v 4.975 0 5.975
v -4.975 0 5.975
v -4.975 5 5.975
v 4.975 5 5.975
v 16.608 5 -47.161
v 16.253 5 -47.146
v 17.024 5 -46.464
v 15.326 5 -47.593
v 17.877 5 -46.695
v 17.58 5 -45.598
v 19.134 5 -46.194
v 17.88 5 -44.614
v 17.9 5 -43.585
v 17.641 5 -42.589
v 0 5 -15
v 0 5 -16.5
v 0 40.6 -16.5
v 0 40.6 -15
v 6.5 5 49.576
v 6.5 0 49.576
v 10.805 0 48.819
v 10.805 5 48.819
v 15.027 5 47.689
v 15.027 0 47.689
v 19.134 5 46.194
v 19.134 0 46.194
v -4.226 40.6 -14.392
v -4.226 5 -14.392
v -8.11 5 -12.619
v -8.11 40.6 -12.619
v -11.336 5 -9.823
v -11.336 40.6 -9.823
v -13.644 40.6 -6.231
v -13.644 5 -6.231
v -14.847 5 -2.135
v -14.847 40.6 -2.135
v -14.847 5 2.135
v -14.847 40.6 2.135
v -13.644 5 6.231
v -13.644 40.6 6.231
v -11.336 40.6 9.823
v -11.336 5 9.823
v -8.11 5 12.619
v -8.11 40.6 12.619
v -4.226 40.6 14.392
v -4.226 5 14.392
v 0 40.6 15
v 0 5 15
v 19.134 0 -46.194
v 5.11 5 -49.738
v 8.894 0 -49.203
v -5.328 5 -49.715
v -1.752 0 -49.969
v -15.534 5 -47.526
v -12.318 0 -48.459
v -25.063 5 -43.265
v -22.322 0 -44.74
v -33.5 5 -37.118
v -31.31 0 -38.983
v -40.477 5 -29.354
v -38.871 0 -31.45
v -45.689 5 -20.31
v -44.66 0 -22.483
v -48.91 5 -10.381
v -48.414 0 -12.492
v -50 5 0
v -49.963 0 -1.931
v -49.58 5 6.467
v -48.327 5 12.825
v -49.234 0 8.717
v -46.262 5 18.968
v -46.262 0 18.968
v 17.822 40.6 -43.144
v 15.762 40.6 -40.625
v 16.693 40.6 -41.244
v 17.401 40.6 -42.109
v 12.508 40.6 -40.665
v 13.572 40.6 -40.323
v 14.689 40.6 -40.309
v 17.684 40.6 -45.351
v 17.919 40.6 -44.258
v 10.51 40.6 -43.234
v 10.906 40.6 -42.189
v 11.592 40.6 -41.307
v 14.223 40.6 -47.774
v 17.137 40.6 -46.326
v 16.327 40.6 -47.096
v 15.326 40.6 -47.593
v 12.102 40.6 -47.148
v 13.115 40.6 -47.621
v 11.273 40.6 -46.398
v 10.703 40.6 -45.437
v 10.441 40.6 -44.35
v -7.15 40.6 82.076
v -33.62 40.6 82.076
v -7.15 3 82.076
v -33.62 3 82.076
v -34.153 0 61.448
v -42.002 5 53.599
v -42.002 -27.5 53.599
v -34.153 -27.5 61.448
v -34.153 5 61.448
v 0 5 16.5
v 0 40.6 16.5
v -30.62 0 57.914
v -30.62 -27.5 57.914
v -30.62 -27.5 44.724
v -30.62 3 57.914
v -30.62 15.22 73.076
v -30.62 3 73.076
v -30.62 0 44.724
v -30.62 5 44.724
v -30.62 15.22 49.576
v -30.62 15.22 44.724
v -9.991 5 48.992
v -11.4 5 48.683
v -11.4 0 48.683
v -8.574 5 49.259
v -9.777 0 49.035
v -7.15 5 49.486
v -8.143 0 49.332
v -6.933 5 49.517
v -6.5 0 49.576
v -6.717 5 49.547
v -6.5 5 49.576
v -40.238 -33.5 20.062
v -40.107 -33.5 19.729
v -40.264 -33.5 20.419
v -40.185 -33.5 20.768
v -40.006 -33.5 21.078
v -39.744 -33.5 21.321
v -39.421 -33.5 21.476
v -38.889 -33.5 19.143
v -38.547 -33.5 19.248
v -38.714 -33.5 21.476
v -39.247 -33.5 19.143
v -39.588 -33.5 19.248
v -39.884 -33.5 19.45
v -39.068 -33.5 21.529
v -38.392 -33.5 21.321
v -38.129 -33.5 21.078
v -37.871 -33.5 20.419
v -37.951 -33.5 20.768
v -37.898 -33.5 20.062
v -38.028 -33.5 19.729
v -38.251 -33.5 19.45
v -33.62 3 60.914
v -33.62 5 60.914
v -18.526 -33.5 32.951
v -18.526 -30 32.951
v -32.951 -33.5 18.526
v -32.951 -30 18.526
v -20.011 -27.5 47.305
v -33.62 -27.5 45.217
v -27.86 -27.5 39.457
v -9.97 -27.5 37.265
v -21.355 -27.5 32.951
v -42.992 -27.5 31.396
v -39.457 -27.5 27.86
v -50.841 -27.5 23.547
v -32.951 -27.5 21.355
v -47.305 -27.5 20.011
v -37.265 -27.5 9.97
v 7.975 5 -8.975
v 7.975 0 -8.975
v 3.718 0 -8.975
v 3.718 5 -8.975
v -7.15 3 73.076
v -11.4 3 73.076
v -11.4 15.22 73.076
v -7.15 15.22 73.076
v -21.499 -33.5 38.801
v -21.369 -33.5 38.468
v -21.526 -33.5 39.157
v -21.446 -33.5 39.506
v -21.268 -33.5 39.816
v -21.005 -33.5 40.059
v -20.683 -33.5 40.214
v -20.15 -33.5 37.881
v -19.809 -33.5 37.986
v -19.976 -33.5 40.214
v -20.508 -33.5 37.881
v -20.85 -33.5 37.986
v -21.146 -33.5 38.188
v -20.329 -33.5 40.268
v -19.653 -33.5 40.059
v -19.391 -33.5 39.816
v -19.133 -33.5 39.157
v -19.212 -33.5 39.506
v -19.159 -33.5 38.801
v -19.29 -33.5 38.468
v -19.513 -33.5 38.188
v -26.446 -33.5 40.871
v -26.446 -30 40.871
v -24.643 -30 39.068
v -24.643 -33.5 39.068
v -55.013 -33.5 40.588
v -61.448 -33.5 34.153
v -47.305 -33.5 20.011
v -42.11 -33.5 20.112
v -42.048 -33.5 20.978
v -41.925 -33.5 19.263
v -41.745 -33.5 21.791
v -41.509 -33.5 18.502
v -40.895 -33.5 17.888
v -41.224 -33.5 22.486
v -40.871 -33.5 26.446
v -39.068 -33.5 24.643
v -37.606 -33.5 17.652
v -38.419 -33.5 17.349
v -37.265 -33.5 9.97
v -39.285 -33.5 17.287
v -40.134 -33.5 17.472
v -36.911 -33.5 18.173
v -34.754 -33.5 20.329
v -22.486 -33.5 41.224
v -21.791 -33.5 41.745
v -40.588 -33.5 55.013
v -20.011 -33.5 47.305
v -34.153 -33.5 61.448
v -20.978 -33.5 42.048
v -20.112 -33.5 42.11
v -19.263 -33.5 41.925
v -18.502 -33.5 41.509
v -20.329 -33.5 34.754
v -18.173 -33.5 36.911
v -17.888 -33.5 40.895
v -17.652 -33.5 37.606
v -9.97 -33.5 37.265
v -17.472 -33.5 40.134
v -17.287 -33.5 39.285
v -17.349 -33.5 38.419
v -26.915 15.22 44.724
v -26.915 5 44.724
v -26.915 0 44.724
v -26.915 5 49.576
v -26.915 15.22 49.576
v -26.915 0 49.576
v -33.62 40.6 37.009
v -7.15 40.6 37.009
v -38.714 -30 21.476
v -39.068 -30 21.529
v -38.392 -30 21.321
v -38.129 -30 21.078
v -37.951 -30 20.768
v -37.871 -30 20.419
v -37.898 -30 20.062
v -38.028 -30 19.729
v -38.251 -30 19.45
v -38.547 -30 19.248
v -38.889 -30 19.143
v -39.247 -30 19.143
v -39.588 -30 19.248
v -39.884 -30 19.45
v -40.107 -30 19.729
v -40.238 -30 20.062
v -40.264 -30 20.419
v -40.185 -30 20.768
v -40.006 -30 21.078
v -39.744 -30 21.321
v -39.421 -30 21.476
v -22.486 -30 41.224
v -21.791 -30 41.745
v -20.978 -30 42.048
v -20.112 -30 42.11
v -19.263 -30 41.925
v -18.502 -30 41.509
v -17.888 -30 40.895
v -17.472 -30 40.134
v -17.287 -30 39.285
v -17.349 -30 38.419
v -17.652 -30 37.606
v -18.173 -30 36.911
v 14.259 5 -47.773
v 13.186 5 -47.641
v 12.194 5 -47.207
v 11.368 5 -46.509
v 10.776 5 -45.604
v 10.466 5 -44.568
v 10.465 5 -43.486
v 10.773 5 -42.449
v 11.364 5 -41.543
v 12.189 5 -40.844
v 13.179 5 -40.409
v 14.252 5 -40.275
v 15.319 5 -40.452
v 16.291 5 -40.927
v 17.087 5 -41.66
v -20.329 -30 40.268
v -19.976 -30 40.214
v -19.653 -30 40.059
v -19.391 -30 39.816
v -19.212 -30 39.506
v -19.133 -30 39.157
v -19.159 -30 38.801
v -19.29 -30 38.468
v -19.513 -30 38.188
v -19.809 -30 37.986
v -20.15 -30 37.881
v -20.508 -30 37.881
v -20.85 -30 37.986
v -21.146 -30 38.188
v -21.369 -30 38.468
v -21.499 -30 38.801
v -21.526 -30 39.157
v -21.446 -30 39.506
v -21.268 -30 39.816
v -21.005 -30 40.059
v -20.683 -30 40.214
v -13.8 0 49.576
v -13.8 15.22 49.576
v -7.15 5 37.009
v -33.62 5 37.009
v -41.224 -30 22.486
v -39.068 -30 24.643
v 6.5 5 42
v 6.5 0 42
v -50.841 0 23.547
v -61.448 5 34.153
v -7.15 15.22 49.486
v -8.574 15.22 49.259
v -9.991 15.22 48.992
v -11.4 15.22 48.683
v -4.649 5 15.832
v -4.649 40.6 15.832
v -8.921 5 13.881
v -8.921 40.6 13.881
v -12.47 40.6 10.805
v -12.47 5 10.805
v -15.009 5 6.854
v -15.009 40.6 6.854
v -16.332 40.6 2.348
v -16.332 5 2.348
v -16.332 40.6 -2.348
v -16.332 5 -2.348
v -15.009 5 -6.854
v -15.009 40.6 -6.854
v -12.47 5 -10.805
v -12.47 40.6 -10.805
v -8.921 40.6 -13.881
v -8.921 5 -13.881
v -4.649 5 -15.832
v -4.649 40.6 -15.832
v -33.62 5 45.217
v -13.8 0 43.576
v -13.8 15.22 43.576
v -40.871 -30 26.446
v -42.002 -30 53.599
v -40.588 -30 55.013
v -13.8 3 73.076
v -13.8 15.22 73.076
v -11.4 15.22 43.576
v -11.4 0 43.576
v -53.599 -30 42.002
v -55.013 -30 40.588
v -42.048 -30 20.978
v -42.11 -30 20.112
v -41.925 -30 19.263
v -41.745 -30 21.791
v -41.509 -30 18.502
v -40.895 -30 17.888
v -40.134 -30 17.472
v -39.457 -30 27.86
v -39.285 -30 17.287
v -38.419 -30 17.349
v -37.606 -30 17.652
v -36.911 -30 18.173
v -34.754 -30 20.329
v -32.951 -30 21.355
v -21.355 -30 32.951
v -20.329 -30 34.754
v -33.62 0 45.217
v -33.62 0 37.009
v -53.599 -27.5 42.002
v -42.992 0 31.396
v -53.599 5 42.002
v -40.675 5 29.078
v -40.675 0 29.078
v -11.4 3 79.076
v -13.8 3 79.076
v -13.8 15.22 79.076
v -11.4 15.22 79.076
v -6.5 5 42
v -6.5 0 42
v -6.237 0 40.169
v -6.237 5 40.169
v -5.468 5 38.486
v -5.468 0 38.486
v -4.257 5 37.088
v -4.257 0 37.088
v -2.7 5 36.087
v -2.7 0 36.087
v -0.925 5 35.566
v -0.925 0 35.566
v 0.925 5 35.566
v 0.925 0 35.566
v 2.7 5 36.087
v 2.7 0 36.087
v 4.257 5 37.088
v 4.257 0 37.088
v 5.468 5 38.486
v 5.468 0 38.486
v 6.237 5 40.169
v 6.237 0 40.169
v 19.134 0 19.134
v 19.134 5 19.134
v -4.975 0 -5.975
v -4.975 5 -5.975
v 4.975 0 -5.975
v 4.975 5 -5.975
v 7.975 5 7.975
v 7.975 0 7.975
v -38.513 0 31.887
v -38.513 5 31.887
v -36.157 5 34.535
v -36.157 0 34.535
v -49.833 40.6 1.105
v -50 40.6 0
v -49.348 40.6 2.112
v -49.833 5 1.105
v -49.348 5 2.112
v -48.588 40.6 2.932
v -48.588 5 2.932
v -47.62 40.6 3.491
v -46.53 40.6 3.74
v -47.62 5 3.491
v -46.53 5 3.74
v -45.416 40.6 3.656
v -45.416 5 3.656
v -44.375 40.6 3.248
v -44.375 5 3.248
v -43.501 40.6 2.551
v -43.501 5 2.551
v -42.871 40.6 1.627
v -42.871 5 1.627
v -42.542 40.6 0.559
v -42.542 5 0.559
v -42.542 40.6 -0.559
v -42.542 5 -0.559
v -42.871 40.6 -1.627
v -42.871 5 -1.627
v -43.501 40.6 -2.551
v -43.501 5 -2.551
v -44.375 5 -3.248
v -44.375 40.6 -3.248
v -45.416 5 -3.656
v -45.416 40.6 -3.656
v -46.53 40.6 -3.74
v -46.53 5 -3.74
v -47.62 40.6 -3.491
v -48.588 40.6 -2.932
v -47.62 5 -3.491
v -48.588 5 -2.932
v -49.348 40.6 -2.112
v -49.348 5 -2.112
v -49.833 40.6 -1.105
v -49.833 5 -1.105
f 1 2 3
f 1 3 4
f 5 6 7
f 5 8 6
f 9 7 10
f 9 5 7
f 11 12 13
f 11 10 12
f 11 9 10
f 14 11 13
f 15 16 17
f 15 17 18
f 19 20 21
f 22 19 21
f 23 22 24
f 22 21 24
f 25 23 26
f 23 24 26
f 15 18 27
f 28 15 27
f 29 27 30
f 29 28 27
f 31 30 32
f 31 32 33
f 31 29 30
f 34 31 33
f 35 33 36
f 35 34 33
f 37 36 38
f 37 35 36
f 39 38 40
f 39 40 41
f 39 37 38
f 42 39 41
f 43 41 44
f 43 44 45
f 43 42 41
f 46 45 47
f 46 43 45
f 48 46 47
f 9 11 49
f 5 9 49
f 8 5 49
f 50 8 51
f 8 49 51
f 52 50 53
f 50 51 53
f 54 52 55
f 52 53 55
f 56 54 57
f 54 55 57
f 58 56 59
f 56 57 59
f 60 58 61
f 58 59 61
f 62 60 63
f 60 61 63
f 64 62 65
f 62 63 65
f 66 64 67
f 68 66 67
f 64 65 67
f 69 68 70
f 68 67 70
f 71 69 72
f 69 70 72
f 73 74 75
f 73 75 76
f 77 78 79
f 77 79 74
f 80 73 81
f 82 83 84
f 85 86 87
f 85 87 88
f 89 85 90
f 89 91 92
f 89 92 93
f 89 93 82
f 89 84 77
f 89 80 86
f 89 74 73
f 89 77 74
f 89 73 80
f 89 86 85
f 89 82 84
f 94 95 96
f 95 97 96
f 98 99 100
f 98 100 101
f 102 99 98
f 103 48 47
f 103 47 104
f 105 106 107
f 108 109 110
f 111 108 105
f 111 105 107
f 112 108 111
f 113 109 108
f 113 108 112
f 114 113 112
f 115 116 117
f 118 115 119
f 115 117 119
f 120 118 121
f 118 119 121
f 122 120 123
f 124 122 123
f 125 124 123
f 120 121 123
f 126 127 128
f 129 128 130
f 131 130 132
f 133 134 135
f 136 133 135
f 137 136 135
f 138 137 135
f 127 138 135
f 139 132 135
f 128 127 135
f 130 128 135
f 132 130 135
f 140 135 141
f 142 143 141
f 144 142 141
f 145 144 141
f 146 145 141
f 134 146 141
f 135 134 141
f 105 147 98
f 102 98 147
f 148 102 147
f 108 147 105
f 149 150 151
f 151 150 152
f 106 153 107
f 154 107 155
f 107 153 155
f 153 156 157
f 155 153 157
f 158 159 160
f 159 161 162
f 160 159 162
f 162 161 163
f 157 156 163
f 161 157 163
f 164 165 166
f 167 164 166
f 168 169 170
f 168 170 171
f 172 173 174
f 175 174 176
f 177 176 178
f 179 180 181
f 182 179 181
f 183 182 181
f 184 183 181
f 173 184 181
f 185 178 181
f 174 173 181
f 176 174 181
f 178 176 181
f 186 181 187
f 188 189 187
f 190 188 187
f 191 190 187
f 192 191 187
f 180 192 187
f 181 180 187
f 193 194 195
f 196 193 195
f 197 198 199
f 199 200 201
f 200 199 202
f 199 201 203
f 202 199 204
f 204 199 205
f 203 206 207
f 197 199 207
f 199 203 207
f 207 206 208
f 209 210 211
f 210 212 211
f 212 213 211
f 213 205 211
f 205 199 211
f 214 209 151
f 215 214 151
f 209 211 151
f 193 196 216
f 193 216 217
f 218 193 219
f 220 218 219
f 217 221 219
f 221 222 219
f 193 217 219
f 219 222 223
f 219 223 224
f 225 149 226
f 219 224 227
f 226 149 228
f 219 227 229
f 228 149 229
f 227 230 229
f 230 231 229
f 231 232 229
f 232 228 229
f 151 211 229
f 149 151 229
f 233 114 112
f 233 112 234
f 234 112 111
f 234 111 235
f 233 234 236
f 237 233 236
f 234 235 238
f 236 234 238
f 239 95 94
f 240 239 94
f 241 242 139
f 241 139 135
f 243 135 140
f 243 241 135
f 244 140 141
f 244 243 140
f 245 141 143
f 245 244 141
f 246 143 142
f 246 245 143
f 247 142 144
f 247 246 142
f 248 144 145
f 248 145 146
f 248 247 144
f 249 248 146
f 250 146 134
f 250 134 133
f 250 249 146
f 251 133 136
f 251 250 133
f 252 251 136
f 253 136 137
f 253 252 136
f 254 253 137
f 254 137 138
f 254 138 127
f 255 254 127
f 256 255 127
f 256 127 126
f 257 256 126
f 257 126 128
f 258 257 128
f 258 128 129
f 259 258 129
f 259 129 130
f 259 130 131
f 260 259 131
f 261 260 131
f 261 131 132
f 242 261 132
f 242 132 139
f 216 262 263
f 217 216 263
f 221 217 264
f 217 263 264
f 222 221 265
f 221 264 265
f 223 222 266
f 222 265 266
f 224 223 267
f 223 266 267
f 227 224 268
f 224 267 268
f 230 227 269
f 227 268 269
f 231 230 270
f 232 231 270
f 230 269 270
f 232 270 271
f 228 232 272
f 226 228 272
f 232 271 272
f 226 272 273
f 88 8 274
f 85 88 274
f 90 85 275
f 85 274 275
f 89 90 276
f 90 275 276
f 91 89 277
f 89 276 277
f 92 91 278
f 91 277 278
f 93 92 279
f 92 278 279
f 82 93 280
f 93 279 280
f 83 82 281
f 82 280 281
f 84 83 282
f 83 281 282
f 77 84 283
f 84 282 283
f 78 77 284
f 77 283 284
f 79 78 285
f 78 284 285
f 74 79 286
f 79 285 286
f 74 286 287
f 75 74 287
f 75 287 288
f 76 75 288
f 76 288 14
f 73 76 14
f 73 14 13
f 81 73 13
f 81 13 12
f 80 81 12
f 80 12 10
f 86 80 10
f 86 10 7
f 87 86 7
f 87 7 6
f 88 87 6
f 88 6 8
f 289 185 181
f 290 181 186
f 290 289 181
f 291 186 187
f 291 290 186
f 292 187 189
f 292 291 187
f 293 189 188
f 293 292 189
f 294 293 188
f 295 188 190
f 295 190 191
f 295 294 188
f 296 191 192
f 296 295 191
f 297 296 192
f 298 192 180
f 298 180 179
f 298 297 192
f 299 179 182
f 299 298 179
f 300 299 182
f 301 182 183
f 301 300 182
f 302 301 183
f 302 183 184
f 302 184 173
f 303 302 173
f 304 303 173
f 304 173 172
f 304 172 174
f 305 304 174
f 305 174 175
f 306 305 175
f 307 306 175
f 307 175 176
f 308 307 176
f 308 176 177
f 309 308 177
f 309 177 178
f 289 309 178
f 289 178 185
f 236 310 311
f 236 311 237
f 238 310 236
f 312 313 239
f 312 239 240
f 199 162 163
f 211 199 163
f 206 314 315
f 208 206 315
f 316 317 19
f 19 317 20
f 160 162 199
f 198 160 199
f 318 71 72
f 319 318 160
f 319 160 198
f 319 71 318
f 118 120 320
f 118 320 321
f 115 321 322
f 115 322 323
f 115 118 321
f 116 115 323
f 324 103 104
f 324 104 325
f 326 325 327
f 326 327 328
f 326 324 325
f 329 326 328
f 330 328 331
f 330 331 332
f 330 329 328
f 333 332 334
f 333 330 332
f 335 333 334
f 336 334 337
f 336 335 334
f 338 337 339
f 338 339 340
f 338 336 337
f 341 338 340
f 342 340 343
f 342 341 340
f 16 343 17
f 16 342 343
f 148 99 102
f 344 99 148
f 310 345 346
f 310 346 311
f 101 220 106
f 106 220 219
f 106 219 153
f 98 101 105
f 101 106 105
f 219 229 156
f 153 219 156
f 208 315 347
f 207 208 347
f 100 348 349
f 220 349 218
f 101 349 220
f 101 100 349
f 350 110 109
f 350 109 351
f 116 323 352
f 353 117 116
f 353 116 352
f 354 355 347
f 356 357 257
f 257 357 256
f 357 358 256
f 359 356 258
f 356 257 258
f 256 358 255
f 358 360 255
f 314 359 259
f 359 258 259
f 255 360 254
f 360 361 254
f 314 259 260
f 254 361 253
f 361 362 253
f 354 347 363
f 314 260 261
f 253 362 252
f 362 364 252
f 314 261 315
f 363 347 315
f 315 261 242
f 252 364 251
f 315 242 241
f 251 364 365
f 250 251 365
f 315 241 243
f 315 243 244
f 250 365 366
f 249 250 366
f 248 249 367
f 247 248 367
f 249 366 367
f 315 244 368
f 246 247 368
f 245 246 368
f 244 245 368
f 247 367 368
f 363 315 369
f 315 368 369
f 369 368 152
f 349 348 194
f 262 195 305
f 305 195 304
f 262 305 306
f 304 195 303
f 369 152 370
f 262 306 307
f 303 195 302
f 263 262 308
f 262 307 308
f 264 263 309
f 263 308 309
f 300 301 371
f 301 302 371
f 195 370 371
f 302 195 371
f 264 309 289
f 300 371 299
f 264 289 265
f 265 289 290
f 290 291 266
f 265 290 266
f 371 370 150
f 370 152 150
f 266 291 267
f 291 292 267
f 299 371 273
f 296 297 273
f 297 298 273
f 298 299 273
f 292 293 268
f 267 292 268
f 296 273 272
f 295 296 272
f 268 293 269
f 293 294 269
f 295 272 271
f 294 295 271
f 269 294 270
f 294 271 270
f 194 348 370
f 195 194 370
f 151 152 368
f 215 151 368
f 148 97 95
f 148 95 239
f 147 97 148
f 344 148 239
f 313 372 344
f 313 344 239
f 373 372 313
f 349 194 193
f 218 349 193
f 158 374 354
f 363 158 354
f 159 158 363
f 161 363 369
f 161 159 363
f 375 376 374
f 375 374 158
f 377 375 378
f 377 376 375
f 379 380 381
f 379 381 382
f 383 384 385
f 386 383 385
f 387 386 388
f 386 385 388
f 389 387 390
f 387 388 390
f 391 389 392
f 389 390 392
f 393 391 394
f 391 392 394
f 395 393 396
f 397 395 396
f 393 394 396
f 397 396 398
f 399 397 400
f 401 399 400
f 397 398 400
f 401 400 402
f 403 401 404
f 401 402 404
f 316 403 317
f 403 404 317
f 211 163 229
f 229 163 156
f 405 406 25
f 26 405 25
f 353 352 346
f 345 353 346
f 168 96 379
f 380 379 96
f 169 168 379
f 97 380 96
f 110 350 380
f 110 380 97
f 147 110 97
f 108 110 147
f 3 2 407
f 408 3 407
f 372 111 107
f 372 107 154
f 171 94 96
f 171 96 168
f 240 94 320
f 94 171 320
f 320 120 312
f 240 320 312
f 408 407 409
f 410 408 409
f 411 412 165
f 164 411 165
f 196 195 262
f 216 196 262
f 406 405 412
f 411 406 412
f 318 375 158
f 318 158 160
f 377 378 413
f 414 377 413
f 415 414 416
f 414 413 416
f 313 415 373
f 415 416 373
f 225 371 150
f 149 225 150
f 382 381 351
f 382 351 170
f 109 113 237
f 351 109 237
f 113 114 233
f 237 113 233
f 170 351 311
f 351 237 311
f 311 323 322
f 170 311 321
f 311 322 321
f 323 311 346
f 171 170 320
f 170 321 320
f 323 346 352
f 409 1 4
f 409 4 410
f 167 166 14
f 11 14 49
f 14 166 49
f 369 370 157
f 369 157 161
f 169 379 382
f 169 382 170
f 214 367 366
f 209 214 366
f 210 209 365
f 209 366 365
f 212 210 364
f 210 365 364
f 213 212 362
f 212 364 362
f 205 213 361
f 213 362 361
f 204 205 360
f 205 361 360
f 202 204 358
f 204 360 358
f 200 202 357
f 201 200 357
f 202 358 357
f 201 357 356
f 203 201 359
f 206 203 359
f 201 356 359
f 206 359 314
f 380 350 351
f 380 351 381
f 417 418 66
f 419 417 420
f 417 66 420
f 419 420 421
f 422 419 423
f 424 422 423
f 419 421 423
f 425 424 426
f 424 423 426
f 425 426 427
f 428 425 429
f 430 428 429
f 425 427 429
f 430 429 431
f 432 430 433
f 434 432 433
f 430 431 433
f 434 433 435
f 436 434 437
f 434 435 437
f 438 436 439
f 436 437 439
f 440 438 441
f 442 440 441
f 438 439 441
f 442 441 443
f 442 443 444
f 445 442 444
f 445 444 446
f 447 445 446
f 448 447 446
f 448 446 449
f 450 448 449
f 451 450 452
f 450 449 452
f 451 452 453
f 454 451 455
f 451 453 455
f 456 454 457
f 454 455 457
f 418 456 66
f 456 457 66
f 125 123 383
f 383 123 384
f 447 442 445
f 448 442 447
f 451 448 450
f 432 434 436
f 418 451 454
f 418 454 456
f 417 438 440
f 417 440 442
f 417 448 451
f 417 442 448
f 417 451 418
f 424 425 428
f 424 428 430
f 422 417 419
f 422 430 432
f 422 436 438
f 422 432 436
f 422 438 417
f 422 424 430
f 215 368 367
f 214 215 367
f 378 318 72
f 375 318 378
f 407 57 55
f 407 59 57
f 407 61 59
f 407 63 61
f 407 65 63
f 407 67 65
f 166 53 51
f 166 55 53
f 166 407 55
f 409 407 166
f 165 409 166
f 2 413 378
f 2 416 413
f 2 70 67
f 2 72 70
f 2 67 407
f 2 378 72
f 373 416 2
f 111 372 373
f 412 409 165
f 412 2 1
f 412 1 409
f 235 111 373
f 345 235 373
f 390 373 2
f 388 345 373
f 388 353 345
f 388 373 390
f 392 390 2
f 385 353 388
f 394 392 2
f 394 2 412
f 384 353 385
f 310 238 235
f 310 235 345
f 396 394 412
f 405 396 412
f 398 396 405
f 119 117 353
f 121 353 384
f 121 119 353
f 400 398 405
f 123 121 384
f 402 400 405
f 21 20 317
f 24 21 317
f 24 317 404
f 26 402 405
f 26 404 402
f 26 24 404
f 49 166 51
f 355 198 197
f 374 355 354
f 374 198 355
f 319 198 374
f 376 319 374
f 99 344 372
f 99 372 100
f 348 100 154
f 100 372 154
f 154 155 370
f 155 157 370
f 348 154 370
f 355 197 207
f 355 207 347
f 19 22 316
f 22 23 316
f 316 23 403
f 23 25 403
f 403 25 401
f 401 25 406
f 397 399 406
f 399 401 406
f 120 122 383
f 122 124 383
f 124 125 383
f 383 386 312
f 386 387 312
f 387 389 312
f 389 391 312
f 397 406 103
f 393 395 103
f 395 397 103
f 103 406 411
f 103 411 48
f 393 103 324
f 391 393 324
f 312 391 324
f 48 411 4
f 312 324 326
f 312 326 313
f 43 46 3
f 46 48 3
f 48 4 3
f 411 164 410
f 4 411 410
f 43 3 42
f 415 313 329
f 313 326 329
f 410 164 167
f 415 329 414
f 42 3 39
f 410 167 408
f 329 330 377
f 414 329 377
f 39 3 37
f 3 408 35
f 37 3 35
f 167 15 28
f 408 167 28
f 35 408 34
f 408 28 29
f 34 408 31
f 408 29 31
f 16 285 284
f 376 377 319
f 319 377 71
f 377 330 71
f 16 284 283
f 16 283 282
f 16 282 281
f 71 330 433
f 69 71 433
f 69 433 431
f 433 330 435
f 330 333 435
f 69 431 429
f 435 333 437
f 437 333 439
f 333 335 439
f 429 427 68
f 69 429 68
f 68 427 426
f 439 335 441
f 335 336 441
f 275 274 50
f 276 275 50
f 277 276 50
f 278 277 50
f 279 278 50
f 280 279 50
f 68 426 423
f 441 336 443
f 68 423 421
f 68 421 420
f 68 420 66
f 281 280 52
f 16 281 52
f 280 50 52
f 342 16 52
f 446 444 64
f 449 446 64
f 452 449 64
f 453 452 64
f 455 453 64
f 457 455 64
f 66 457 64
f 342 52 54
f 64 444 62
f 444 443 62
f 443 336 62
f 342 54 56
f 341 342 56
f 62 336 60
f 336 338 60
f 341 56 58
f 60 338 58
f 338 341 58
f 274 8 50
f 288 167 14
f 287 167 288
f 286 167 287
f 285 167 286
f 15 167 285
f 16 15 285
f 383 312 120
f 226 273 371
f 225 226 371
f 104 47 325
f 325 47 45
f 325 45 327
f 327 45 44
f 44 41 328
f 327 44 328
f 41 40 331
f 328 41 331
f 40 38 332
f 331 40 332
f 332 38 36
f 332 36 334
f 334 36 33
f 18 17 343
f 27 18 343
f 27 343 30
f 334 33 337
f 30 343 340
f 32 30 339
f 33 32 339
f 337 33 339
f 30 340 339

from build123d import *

# Parameters (mm, degrees)
SKETCH1_W               = 9.95
SKETCH1_H               = 11.95
BOSS_EXTRUDE2_DEPTH     = 5
BOSS_EXTRUDE6_DEPTH     = 35.6
SKETCH8_R               = 3.75
BOSS_EXTRUDE8_DEPTH     = 35.6
BOSS_EXTRUDE9_DEPTH     = 12.22
CUT_EXTRUDE1_DEPTH      = 104.199711628
CUT_EXTRUDE1_DEPTH_BACK = 104.199711628
SKETCH10_W              = 26.47
SKETCH10_H              = 45.066300886
BOSS_EXTRUDE10_DEPTH    = 25.38
CUT_EXTRUDE2_DEPTH      = 104.199711628
CUT_EXTRUDE2_DEPTH_BACK = 12.22
SKETCH11_W              = 3.704655087
SKETCH11_H              = 4.851710635
SKETCH14_R              = 1.2
SKETCH14_R_2            = 1.199999993
BOSS_EXTRUDE11_DEPTH    = 2.5
BOSS_EXTRUDE12_DEPTH    = 6
SKETCH17_R              = 1.199999993
BOSS_EXTRUDE13_DEPTH    = 6
CUT_EXTRUDE3_DEPTH      = 122.35580118
CUT_EXTRUDE3_DEPTH_BACK = 122.35580118
SKETCH18_W              = 20
SKETCH18_H              = 100
BOSS_EXTRUDE14_DEPTH    = 20
BOSS_EXTRUDE15_DEPTH    = 5
CUT_EXTRUDE4_START      = 30
CUT_EXTRUDE4_DEPTH      = 30
BOSS_EXTRUDE16_START    = 3
BOSS_EXTRUDE16_DEPTH    = 3
BOSS_EXTRUDE17_START    = 3
BOSS_EXTRUDE17_DEPTH    = 3
BOSS_EXTRUDE18_DEPTH    = 27.5


with BuildPart() as part:
    # Sketch1 → Boss-Extrude2 (new body)
    with BuildSketch(Plane(origin=(0, 0, 0), x_dir=(1, 0, 0), z_dir=(0, 1, 0))):
        with BuildLine():
            Line((35.355339059, -35.355339059), (7.975, -7.975))
            Line((7.975, -7.975), (7.975, 8.975))
            Line((7.975, 8.975), (3.717566722, 8.975))
            Line((3.717566722, 8.975), (19.134171618, 46.193976626))
            ThreePointArc((19.134171618, 46.193976626), (-48.299723588, 12.928136036), (-6.5, -49.575699692))
            Line((-6.5, -49.575699692), (-6.5, -42))
            ThreePointArc((-6.5, -42), (0, -35.5), (6.5, -42))
            Line((6.5, -42), (6.5, -49.575699692))
            ThreePointArc((6.5, -49.575699692), (22.102534155, -44.84950372), (35.355339059, -35.355339059))
        make_face()
        Rectangle(SKETCH1_W, SKETCH1_H, mode=Mode.SUBTRACT)
    extrude(amount=BOSS_EXTRUDE2_DEPTH)

    # Sketch4 → Boss-Extrude6 (add)
    with BuildSketch(Plane(origin=(0, 5, 0), x_dir=(1, 0, 0), z_dir=(0, 1, 0))):
        with BuildLine():
            Line((0, 16.5), (0, 15))
            ThreePointArc((0, 15), (-15, 0), (0, -15))
            Line((0, -15), (0, -16.5))
            ThreePointArc((0, -16.5), (-16.5, 0), (0, 16.5))
        make_face()
    extrude(amount=BOSS_EXTRUDE6_DEPTH)

    # Sketch8 → Boss-Extrude8 (add)
    with BuildSketch(Plane(origin=(0, 5, 0), x_dir=(1, 0, 0), z_dir=(0, 1, 0))):
        with Locations(Location((14.176286342, 44.023804987, 0), (0, 0, 72.150709005))):
            Circle(SKETCH8_R)
        with Locations(Location((29.944361597, -35.247662455, 0), (0, 0, 45))):
            Circle(SKETCH8_R)
        with Locations(Location((-46.25, 0, 0), (0, 0, 179.999564815))):
            Circle(SKETCH8_R)
    extrude(amount=BOSS_EXTRUDE8_DEPTH)

    # Sketch9 → Boss-Extrude9 (add)
    with BuildSketch(Plane(origin=(0, 3, 0), x_dir=(-1, 0, 0), z_dir=(0, -1, 0))):
        with BuildLine():
            Line((11.4, -79.075699692), (11.4, -73.075699692))
            Line((11.4, -73.075699692), (7.15, -73.075699692))
            Line((7.15, -73.075699692), (7.15, -82.075699692))
            Line((7.15, -82.075699692), (33.62, -82.075699692))
            Line((33.62, -82.075699692), (33.62, -37.009398806))
            ThreePointArc((33.62, -37.009398806), (24.345047627, -43.67285949), (13.8, -48.057881768))
            Line((13.8, -48.057881768), (13.8, -49.575699692))
            Line((13.8, -49.575699692), (30.62, -49.575699692))
            Line((30.62, -49.575699692), (30.62, -73.075699692))
            Line((30.62, -73.075699692), (13.8, -73.075699692))
            Line((13.8, -73.075699692), (13.8, -79.075699692))
            Line((13.8, -79.075699692), (11.4, -79.075699692))
        make_face()
        with BuildLine():
            Line((7.15, -37.009398806), (7.15, -49.486134422))
            ThreePointArc((7.15, -49.486134422), (9.283687764, -49.130572371), (11.4, -48.683056601))
            Line((11.4, -48.683056601), (11.4, -43.575699692))
            Line((11.4, -43.575699692), (13.8, -43.575699692))
            Line((13.8, -43.575699692), (13.8, -48.057881768))
            ThreePointArc((13.8, -48.057881768), (24.345047627, -43.67285949), (33.62, -37.009398806))
            Line((33.62, -37.009398806), (7.15, -37.009398806))
        make_face()
    extrude(amount=-BOSS_EXTRUDE9_DEPTH)

    # Sketch9<3> → Cut-Extrude1 (cut, two sides: drawn at the far end of the back side and taken through both)
    with BuildSketch(Plane(origin=(0, 3, 0), x_dir=(-1, 0, 0), z_dir=(0, -1, 0)).offset(-CUT_EXTRUDE1_DEPTH_BACK)):
        with BuildLine():
            Line((7.15, -73.075699692), (11.4, -73.075699692))
            Line((11.4, -73.075699692), (11.4, -79.075699692))
            Line((11.4, -79.075699692), (13.8, -79.075699692))
            Line((13.8, -79.075699692), (13.8, -73.075699692))
            Line((13.8, -73.075699692), (30.62, -73.075699692))
            Line((30.62, -73.075699692), (30.62, -49.575699692))
            Line((30.62, -49.575699692), (13.8, -49.575699692))
            Line((13.8, -49.575699692), (13.8, -48.057881768))
            ThreePointArc((13.8, -48.057881768), (12.60387682, -48.38535201), (11.4, -48.683056601))
            Line((11.4, -48.683056601), (11.4, -49.575699692))
            Line((11.4, -49.575699692), (7.15, -49.575699692))
            Line((7.15, -49.575699692), (7.15, -73.075699692))
        make_face()
        with BuildLine():
            Line((11.4, -43.575699692), (11.4, -48.683056601))
            ThreePointArc((11.4, -48.683056601), (12.60387682, -48.38535201), (13.8, -48.057881768))
            Line((13.8, -48.057881768), (13.8, -43.575699692))
            Line((13.8, -43.575699692), (11.4, -43.575699692))
        make_face()
    extrude(amount=CUT_EXTRUDE1_DEPTH + CUT_EXTRUDE1_DEPTH_BACK, mode=Mode.SUBTRACT)

    # Sketch10 → Boss-Extrude10 (add)
    with BuildSketch(Plane(origin=(0, 15.22, 0), x_dir=(1, 0, 0), z_dir=(0, 1, 0))):
        with Locations((-20.385, -59.542549249)):
            Rectangle(SKETCH10_W, SKETCH10_H)
    extrude(amount=BOSS_EXTRUDE10_DEPTH)

    # Sketch11 → Cut-Extrude2 (cut, two sides: drawn at the far end of the back side and taken through both)
    with BuildSketch(Plane.XZ.offset(-3).offset(-CUT_EXTRUDE2_DEPTH_BACK)):
        with Locations((-28.767672457, 47.149844375)):
            Rectangle(SKETCH11_W, SKETCH11_H)
    extrude(amount=CUT_EXTRUDE2_DEPTH + CUT_EXTRUDE2_DEPTH_BACK, mode=Mode.SUBTRACT)

    # Sketch18 → Cut-Extrude3 (cut, two sides: drawn at the far end of the back side and taken through both)
    with BuildSketch(Plane.XZ.offset(33.5).offset(-CUT_EXTRUDE3_DEPTH_BACK)):
        with Locations((29.134171618, 3.806023374)):
            Rectangle(SKETCH18_W, SKETCH18_H)
    extrude(amount=CUT_EXTRUDE3_DEPTH + CUT_EXTRUDE3_DEPTH_BACK, mode=Mode.SUBTRACT)

    # Sketch20 → Boss-Extrude15 (add)
    with BuildSketch(Plane(origin=(0, 5, 0), x_dir=(1, 0, 0), z_dir=(0, 1, 0))):
        Polygon((-61.447579228, -34.153257501), (-44.858284064, -17.563962337), (-37.009398806, -25.412847595), (-53.59869397, -42.002142759), align=None)
        Polygon((-42.002142759, -53.59869397), (-34.153257487, -61.447579241), (-17.563962324, -44.858284077), (-25.412847595, -37.009398806), align=None)
    extrude(amount=-BOSS_EXTRUDE15_DEPTH)

    # Sketch21 → Cut-Extrude4 (cut)
    with BuildSketch(Plane.XZ.offset(-15.22).offset(CUT_EXTRUDE4_START)):
        with BuildLine():
            Line((-7.15, 49.486134422), (-7.15, 73.075699692))
            Line((-7.15, 73.075699692), (-11.4, 73.075699692))
            Line((-11.4, 73.075699692), (-11.4, 79.075699692))
            Line((-11.4, 79.075699692), (-13.8, 79.075699692))
            Line((-13.8, 79.075699692), (-13.8, 73.075699692))
            Line((-13.8, 73.075699692), (-30.62, 73.075699692))
            Line((-30.62, 73.075699692), (-30.62, 44.723989057))
            Line((-30.62, 44.723989057), (-26.915344913, 44.723989057))
            Line((-26.915344913, 44.723989057), (-26.915344913, 49.575699692))
            Line((-26.915344913, 49.575699692), (-13.8, 49.575699692))
            Line((-13.8, 49.575699692), (-13.8, 43.575699692))
            Line((-13.8, 43.575699692), (-11.4, 43.575699692))
            Line((-11.4, 43.575699692), (-11.4, 48.683056601))
            ThreePointArc((-11.4, 48.683056601), (-9.283687764, 49.130572371), (-7.15, 49.486134422))
        make_face()
    extrude(amount=-CUT_EXTRUDE4_DEPTH, mode=Mode.SUBTRACT)

    # Sketch22 → Boss-Extrude16 (add)
    with BuildSketch(Plane.XZ.offset(-3).offset(BOSS_EXTRUDE16_START)):
        with BuildLine():
            Line((-29.078364141, 40.674915352), (-33.62, 45.216551211))
            Line((-33.62, 45.216551211), (-33.62, 37.009398806))
            ThreePointArc((-33.62, 37.009398806), (-31.402710382, 38.908479547), (-29.078364141, 40.674915352))
        make_face()
    extrude(amount=-BOSS_EXTRUDE16_DEPTH)

    # Sketch23 → Boss-Extrude17 (add)
    with BuildSketch(Plane.XZ.offset(-3).offset(BOSS_EXTRUDE17_START)):
        with BuildLine():
            Line((-22.281377939, 49.575699692), (-18.968096289, 46.262418043))
            ThreePointArc((-18.968096289, 46.262418043), (-16.408624443, 47.23089078), (-13.8, 48.057881768))
            Line((-13.8, 48.057881768), (-13.8, 49.575699692))
            Line((-13.8, 49.575699692), (-22.281377939, 49.575699692))
        make_face()
    extrude(amount=-BOSS_EXTRUDE17_DEPTH)



with BuildPart() as body_2:
    # Sketch14 → Boss-Extrude11 (new body)
    with BuildSketch(Plane(origin=(0, -30, 0), x_dir=(-1, 0, 0), z_dir=(0, -1, 0))):
        with BuildLine():
            Line((24.642671324, -39.067649661), (26.445793573, -40.870771909))
            Line((26.445793573, -40.870771909), (27.860007135, -39.456558346))
            Line((27.860007135, -39.456558346), (21.354624748, -32.951175959))
            Line((21.354624748, -32.951175959), (32.951175959, -21.354624748))
            Line((32.951175959, -21.354624748), (39.456558346, -27.860007135))
            Line((39.456558346, -27.860007135), (40.870771909, -26.445793573))
            Line((40.870771909, -26.445793573), (39.067649617, -24.64267128))
            Line((39.067649617, -24.64267128), (41.224325286, -22.485995585))
            ThreePointArc((41.224325286, -22.485995585), (41.22432526, -18.17264422), (36.910973895, -18.172644246))
            Line((36.910973895, -18.172644246), (34.754298225, -20.329319941))
            Line((34.754298225, -20.329319941), (32.951175922, -18.52619766))
            Line((32.951175922, -18.52619766), (18.526197623, -32.951175959))
            Line((18.526197623, -32.951175959), (20.329319959, -34.754298295))
            Line((20.329319959, -34.754298295), (18.172644276, -36.910973978))
            ThreePointArc((18.172644276, -36.910973978), (18.172644276, -41.224325343), (22.485995642, -41.224325343))
            Line((22.485995642, -41.224325343), (24.642671324, -39.067649661))
        make_face()
        with Locations(Location((20.329319959, -39.067649661, 0), (0, 0, 90))):
            Circle(SKETCH14_R, mode=Mode.SUBTRACT)
        with Locations(Location((39.06764959, -20.329319915, 0), (0, 0, 90))):
            Circle(SKETCH14_R_2, mode=Mode.SUBTRACT)
    extrude(amount=-BOSS_EXTRUDE11_DEPTH)

    # Sketch15 → Boss-Extrude12 (add)
    with BuildSketch(Plane(origin=(0, -27.5, 0), x_dir=(1, 0, 0), z_dir=(0, 1, 0))):
        with BuildLine():
            Line((-40.870771909, -26.445793573), (-47.305443604, -20.011121877))
            Line((-47.305443604, -20.011121877), (-37.264527312, -9.970205584))
            Line((-37.264527312, -9.970205584), (-9.970205571, -37.264527325))
            Line((-9.970205571, -37.264527325), (-20.011121864, -47.305443618))
            Line((-20.011121864, -47.305443618), (-26.445793573, -40.870771909))
            Line((-26.445793573, -40.870771909), (-24.642671324, -39.067649661))
            Line((-24.642671324, -39.067649661), (-22.485995642, -41.224325343))
            ThreePointArc((-22.485995642, -41.224325343), (-18.172644276, -41.224325343), (-18.172644276, -36.910973978))
            Line((-18.172644276, -36.910973978), (-20.329319959, -34.754298295))
            Line((-20.329319959, -34.754298295), (-18.526197623, -32.951175959))
            Line((-18.526197623, -32.951175959), (-32.951175922, -18.52619766))
            Line((-32.951175922, -18.52619766), (-34.754298225, -20.329319941))
            Line((-34.754298225, -20.329319941), (-36.910973895, -18.172644246))
            ThreePointArc((-36.910973895, -18.172644246), (-41.22432526, -18.17264422), (-41.224325286, -22.485995585))
            Line((-41.224325286, -22.485995585), (-39.067649617, -24.64267128))
            Line((-39.067649617, -24.64267128), (-40.870771909, -26.445793573))
        make_face()
    extrude(amount=-BOSS_EXTRUDE12_DEPTH)

    # Sketch17 → Boss-Extrude13 (add)
    with BuildSketch(Plane(origin=(0, -27.5, 0), x_dir=(1, 0, 0), z_dir=(0, 1, 0))):
        with Locations(Location((-39.06764959, -20.329319915, 0), (0, 0, 270))):
            Circle(SKETCH17_R)
        with Locations(Location((-20.329319959, -39.067649661, 0), (0, 0, 270))):
            Circle(SKETCH17_R)
    extrude(amount=-BOSS_EXTRUDE13_DEPTH)

    # Sketch19 → Boss-Extrude14 (add)
    with BuildSketch(Plane(origin=(-33.658282741, 0, 33.658282741), x_dir=(0.7071067811865464, 0, 0.7071067811865488), z_dir=(-0.7071067811865488, 0, 0.7071067811865464))):
        Polygon((8.2, -30), (10.2, -30), (10.2, -33.5), (19.3, -33.5), (19.3, -27.5), (8.2, -27.5), align=None)
        Polygon((-10.2, -30), (-8.2, -30), (-8.2, -27.5), (-19.299999981, -27.5), (-19.299999981, -33.5), (-10.2, -33.5), align=None)
    extrude(amount=BOSS_EXTRUDE14_DEPTH)


with BuildPart() as part_1:
    add(part.part)

    add(body_2.part)  # Boss-Extrude18 merges body 2
    # Sketch24 → Boss-Extrude18 (add)
    with BuildSketch(Plane.XZ):
        Polygon((-61.447579228, 34.153257501), (-53.59869397, 42.002142759), (-42.992092252, 31.395541041), (-50.84097751, 23.546655783), align=None)
        Polygon((-34.153257487, 61.447579241), (-30.62, 57.914321754), (-30.62, 44.723989057), (-33.62, 45.216551211), (-42.002142759, 53.59869397), align=None)
    extrude(amount=BOSS_EXTRUDE18_DEPTH)


solid = part_1.part
